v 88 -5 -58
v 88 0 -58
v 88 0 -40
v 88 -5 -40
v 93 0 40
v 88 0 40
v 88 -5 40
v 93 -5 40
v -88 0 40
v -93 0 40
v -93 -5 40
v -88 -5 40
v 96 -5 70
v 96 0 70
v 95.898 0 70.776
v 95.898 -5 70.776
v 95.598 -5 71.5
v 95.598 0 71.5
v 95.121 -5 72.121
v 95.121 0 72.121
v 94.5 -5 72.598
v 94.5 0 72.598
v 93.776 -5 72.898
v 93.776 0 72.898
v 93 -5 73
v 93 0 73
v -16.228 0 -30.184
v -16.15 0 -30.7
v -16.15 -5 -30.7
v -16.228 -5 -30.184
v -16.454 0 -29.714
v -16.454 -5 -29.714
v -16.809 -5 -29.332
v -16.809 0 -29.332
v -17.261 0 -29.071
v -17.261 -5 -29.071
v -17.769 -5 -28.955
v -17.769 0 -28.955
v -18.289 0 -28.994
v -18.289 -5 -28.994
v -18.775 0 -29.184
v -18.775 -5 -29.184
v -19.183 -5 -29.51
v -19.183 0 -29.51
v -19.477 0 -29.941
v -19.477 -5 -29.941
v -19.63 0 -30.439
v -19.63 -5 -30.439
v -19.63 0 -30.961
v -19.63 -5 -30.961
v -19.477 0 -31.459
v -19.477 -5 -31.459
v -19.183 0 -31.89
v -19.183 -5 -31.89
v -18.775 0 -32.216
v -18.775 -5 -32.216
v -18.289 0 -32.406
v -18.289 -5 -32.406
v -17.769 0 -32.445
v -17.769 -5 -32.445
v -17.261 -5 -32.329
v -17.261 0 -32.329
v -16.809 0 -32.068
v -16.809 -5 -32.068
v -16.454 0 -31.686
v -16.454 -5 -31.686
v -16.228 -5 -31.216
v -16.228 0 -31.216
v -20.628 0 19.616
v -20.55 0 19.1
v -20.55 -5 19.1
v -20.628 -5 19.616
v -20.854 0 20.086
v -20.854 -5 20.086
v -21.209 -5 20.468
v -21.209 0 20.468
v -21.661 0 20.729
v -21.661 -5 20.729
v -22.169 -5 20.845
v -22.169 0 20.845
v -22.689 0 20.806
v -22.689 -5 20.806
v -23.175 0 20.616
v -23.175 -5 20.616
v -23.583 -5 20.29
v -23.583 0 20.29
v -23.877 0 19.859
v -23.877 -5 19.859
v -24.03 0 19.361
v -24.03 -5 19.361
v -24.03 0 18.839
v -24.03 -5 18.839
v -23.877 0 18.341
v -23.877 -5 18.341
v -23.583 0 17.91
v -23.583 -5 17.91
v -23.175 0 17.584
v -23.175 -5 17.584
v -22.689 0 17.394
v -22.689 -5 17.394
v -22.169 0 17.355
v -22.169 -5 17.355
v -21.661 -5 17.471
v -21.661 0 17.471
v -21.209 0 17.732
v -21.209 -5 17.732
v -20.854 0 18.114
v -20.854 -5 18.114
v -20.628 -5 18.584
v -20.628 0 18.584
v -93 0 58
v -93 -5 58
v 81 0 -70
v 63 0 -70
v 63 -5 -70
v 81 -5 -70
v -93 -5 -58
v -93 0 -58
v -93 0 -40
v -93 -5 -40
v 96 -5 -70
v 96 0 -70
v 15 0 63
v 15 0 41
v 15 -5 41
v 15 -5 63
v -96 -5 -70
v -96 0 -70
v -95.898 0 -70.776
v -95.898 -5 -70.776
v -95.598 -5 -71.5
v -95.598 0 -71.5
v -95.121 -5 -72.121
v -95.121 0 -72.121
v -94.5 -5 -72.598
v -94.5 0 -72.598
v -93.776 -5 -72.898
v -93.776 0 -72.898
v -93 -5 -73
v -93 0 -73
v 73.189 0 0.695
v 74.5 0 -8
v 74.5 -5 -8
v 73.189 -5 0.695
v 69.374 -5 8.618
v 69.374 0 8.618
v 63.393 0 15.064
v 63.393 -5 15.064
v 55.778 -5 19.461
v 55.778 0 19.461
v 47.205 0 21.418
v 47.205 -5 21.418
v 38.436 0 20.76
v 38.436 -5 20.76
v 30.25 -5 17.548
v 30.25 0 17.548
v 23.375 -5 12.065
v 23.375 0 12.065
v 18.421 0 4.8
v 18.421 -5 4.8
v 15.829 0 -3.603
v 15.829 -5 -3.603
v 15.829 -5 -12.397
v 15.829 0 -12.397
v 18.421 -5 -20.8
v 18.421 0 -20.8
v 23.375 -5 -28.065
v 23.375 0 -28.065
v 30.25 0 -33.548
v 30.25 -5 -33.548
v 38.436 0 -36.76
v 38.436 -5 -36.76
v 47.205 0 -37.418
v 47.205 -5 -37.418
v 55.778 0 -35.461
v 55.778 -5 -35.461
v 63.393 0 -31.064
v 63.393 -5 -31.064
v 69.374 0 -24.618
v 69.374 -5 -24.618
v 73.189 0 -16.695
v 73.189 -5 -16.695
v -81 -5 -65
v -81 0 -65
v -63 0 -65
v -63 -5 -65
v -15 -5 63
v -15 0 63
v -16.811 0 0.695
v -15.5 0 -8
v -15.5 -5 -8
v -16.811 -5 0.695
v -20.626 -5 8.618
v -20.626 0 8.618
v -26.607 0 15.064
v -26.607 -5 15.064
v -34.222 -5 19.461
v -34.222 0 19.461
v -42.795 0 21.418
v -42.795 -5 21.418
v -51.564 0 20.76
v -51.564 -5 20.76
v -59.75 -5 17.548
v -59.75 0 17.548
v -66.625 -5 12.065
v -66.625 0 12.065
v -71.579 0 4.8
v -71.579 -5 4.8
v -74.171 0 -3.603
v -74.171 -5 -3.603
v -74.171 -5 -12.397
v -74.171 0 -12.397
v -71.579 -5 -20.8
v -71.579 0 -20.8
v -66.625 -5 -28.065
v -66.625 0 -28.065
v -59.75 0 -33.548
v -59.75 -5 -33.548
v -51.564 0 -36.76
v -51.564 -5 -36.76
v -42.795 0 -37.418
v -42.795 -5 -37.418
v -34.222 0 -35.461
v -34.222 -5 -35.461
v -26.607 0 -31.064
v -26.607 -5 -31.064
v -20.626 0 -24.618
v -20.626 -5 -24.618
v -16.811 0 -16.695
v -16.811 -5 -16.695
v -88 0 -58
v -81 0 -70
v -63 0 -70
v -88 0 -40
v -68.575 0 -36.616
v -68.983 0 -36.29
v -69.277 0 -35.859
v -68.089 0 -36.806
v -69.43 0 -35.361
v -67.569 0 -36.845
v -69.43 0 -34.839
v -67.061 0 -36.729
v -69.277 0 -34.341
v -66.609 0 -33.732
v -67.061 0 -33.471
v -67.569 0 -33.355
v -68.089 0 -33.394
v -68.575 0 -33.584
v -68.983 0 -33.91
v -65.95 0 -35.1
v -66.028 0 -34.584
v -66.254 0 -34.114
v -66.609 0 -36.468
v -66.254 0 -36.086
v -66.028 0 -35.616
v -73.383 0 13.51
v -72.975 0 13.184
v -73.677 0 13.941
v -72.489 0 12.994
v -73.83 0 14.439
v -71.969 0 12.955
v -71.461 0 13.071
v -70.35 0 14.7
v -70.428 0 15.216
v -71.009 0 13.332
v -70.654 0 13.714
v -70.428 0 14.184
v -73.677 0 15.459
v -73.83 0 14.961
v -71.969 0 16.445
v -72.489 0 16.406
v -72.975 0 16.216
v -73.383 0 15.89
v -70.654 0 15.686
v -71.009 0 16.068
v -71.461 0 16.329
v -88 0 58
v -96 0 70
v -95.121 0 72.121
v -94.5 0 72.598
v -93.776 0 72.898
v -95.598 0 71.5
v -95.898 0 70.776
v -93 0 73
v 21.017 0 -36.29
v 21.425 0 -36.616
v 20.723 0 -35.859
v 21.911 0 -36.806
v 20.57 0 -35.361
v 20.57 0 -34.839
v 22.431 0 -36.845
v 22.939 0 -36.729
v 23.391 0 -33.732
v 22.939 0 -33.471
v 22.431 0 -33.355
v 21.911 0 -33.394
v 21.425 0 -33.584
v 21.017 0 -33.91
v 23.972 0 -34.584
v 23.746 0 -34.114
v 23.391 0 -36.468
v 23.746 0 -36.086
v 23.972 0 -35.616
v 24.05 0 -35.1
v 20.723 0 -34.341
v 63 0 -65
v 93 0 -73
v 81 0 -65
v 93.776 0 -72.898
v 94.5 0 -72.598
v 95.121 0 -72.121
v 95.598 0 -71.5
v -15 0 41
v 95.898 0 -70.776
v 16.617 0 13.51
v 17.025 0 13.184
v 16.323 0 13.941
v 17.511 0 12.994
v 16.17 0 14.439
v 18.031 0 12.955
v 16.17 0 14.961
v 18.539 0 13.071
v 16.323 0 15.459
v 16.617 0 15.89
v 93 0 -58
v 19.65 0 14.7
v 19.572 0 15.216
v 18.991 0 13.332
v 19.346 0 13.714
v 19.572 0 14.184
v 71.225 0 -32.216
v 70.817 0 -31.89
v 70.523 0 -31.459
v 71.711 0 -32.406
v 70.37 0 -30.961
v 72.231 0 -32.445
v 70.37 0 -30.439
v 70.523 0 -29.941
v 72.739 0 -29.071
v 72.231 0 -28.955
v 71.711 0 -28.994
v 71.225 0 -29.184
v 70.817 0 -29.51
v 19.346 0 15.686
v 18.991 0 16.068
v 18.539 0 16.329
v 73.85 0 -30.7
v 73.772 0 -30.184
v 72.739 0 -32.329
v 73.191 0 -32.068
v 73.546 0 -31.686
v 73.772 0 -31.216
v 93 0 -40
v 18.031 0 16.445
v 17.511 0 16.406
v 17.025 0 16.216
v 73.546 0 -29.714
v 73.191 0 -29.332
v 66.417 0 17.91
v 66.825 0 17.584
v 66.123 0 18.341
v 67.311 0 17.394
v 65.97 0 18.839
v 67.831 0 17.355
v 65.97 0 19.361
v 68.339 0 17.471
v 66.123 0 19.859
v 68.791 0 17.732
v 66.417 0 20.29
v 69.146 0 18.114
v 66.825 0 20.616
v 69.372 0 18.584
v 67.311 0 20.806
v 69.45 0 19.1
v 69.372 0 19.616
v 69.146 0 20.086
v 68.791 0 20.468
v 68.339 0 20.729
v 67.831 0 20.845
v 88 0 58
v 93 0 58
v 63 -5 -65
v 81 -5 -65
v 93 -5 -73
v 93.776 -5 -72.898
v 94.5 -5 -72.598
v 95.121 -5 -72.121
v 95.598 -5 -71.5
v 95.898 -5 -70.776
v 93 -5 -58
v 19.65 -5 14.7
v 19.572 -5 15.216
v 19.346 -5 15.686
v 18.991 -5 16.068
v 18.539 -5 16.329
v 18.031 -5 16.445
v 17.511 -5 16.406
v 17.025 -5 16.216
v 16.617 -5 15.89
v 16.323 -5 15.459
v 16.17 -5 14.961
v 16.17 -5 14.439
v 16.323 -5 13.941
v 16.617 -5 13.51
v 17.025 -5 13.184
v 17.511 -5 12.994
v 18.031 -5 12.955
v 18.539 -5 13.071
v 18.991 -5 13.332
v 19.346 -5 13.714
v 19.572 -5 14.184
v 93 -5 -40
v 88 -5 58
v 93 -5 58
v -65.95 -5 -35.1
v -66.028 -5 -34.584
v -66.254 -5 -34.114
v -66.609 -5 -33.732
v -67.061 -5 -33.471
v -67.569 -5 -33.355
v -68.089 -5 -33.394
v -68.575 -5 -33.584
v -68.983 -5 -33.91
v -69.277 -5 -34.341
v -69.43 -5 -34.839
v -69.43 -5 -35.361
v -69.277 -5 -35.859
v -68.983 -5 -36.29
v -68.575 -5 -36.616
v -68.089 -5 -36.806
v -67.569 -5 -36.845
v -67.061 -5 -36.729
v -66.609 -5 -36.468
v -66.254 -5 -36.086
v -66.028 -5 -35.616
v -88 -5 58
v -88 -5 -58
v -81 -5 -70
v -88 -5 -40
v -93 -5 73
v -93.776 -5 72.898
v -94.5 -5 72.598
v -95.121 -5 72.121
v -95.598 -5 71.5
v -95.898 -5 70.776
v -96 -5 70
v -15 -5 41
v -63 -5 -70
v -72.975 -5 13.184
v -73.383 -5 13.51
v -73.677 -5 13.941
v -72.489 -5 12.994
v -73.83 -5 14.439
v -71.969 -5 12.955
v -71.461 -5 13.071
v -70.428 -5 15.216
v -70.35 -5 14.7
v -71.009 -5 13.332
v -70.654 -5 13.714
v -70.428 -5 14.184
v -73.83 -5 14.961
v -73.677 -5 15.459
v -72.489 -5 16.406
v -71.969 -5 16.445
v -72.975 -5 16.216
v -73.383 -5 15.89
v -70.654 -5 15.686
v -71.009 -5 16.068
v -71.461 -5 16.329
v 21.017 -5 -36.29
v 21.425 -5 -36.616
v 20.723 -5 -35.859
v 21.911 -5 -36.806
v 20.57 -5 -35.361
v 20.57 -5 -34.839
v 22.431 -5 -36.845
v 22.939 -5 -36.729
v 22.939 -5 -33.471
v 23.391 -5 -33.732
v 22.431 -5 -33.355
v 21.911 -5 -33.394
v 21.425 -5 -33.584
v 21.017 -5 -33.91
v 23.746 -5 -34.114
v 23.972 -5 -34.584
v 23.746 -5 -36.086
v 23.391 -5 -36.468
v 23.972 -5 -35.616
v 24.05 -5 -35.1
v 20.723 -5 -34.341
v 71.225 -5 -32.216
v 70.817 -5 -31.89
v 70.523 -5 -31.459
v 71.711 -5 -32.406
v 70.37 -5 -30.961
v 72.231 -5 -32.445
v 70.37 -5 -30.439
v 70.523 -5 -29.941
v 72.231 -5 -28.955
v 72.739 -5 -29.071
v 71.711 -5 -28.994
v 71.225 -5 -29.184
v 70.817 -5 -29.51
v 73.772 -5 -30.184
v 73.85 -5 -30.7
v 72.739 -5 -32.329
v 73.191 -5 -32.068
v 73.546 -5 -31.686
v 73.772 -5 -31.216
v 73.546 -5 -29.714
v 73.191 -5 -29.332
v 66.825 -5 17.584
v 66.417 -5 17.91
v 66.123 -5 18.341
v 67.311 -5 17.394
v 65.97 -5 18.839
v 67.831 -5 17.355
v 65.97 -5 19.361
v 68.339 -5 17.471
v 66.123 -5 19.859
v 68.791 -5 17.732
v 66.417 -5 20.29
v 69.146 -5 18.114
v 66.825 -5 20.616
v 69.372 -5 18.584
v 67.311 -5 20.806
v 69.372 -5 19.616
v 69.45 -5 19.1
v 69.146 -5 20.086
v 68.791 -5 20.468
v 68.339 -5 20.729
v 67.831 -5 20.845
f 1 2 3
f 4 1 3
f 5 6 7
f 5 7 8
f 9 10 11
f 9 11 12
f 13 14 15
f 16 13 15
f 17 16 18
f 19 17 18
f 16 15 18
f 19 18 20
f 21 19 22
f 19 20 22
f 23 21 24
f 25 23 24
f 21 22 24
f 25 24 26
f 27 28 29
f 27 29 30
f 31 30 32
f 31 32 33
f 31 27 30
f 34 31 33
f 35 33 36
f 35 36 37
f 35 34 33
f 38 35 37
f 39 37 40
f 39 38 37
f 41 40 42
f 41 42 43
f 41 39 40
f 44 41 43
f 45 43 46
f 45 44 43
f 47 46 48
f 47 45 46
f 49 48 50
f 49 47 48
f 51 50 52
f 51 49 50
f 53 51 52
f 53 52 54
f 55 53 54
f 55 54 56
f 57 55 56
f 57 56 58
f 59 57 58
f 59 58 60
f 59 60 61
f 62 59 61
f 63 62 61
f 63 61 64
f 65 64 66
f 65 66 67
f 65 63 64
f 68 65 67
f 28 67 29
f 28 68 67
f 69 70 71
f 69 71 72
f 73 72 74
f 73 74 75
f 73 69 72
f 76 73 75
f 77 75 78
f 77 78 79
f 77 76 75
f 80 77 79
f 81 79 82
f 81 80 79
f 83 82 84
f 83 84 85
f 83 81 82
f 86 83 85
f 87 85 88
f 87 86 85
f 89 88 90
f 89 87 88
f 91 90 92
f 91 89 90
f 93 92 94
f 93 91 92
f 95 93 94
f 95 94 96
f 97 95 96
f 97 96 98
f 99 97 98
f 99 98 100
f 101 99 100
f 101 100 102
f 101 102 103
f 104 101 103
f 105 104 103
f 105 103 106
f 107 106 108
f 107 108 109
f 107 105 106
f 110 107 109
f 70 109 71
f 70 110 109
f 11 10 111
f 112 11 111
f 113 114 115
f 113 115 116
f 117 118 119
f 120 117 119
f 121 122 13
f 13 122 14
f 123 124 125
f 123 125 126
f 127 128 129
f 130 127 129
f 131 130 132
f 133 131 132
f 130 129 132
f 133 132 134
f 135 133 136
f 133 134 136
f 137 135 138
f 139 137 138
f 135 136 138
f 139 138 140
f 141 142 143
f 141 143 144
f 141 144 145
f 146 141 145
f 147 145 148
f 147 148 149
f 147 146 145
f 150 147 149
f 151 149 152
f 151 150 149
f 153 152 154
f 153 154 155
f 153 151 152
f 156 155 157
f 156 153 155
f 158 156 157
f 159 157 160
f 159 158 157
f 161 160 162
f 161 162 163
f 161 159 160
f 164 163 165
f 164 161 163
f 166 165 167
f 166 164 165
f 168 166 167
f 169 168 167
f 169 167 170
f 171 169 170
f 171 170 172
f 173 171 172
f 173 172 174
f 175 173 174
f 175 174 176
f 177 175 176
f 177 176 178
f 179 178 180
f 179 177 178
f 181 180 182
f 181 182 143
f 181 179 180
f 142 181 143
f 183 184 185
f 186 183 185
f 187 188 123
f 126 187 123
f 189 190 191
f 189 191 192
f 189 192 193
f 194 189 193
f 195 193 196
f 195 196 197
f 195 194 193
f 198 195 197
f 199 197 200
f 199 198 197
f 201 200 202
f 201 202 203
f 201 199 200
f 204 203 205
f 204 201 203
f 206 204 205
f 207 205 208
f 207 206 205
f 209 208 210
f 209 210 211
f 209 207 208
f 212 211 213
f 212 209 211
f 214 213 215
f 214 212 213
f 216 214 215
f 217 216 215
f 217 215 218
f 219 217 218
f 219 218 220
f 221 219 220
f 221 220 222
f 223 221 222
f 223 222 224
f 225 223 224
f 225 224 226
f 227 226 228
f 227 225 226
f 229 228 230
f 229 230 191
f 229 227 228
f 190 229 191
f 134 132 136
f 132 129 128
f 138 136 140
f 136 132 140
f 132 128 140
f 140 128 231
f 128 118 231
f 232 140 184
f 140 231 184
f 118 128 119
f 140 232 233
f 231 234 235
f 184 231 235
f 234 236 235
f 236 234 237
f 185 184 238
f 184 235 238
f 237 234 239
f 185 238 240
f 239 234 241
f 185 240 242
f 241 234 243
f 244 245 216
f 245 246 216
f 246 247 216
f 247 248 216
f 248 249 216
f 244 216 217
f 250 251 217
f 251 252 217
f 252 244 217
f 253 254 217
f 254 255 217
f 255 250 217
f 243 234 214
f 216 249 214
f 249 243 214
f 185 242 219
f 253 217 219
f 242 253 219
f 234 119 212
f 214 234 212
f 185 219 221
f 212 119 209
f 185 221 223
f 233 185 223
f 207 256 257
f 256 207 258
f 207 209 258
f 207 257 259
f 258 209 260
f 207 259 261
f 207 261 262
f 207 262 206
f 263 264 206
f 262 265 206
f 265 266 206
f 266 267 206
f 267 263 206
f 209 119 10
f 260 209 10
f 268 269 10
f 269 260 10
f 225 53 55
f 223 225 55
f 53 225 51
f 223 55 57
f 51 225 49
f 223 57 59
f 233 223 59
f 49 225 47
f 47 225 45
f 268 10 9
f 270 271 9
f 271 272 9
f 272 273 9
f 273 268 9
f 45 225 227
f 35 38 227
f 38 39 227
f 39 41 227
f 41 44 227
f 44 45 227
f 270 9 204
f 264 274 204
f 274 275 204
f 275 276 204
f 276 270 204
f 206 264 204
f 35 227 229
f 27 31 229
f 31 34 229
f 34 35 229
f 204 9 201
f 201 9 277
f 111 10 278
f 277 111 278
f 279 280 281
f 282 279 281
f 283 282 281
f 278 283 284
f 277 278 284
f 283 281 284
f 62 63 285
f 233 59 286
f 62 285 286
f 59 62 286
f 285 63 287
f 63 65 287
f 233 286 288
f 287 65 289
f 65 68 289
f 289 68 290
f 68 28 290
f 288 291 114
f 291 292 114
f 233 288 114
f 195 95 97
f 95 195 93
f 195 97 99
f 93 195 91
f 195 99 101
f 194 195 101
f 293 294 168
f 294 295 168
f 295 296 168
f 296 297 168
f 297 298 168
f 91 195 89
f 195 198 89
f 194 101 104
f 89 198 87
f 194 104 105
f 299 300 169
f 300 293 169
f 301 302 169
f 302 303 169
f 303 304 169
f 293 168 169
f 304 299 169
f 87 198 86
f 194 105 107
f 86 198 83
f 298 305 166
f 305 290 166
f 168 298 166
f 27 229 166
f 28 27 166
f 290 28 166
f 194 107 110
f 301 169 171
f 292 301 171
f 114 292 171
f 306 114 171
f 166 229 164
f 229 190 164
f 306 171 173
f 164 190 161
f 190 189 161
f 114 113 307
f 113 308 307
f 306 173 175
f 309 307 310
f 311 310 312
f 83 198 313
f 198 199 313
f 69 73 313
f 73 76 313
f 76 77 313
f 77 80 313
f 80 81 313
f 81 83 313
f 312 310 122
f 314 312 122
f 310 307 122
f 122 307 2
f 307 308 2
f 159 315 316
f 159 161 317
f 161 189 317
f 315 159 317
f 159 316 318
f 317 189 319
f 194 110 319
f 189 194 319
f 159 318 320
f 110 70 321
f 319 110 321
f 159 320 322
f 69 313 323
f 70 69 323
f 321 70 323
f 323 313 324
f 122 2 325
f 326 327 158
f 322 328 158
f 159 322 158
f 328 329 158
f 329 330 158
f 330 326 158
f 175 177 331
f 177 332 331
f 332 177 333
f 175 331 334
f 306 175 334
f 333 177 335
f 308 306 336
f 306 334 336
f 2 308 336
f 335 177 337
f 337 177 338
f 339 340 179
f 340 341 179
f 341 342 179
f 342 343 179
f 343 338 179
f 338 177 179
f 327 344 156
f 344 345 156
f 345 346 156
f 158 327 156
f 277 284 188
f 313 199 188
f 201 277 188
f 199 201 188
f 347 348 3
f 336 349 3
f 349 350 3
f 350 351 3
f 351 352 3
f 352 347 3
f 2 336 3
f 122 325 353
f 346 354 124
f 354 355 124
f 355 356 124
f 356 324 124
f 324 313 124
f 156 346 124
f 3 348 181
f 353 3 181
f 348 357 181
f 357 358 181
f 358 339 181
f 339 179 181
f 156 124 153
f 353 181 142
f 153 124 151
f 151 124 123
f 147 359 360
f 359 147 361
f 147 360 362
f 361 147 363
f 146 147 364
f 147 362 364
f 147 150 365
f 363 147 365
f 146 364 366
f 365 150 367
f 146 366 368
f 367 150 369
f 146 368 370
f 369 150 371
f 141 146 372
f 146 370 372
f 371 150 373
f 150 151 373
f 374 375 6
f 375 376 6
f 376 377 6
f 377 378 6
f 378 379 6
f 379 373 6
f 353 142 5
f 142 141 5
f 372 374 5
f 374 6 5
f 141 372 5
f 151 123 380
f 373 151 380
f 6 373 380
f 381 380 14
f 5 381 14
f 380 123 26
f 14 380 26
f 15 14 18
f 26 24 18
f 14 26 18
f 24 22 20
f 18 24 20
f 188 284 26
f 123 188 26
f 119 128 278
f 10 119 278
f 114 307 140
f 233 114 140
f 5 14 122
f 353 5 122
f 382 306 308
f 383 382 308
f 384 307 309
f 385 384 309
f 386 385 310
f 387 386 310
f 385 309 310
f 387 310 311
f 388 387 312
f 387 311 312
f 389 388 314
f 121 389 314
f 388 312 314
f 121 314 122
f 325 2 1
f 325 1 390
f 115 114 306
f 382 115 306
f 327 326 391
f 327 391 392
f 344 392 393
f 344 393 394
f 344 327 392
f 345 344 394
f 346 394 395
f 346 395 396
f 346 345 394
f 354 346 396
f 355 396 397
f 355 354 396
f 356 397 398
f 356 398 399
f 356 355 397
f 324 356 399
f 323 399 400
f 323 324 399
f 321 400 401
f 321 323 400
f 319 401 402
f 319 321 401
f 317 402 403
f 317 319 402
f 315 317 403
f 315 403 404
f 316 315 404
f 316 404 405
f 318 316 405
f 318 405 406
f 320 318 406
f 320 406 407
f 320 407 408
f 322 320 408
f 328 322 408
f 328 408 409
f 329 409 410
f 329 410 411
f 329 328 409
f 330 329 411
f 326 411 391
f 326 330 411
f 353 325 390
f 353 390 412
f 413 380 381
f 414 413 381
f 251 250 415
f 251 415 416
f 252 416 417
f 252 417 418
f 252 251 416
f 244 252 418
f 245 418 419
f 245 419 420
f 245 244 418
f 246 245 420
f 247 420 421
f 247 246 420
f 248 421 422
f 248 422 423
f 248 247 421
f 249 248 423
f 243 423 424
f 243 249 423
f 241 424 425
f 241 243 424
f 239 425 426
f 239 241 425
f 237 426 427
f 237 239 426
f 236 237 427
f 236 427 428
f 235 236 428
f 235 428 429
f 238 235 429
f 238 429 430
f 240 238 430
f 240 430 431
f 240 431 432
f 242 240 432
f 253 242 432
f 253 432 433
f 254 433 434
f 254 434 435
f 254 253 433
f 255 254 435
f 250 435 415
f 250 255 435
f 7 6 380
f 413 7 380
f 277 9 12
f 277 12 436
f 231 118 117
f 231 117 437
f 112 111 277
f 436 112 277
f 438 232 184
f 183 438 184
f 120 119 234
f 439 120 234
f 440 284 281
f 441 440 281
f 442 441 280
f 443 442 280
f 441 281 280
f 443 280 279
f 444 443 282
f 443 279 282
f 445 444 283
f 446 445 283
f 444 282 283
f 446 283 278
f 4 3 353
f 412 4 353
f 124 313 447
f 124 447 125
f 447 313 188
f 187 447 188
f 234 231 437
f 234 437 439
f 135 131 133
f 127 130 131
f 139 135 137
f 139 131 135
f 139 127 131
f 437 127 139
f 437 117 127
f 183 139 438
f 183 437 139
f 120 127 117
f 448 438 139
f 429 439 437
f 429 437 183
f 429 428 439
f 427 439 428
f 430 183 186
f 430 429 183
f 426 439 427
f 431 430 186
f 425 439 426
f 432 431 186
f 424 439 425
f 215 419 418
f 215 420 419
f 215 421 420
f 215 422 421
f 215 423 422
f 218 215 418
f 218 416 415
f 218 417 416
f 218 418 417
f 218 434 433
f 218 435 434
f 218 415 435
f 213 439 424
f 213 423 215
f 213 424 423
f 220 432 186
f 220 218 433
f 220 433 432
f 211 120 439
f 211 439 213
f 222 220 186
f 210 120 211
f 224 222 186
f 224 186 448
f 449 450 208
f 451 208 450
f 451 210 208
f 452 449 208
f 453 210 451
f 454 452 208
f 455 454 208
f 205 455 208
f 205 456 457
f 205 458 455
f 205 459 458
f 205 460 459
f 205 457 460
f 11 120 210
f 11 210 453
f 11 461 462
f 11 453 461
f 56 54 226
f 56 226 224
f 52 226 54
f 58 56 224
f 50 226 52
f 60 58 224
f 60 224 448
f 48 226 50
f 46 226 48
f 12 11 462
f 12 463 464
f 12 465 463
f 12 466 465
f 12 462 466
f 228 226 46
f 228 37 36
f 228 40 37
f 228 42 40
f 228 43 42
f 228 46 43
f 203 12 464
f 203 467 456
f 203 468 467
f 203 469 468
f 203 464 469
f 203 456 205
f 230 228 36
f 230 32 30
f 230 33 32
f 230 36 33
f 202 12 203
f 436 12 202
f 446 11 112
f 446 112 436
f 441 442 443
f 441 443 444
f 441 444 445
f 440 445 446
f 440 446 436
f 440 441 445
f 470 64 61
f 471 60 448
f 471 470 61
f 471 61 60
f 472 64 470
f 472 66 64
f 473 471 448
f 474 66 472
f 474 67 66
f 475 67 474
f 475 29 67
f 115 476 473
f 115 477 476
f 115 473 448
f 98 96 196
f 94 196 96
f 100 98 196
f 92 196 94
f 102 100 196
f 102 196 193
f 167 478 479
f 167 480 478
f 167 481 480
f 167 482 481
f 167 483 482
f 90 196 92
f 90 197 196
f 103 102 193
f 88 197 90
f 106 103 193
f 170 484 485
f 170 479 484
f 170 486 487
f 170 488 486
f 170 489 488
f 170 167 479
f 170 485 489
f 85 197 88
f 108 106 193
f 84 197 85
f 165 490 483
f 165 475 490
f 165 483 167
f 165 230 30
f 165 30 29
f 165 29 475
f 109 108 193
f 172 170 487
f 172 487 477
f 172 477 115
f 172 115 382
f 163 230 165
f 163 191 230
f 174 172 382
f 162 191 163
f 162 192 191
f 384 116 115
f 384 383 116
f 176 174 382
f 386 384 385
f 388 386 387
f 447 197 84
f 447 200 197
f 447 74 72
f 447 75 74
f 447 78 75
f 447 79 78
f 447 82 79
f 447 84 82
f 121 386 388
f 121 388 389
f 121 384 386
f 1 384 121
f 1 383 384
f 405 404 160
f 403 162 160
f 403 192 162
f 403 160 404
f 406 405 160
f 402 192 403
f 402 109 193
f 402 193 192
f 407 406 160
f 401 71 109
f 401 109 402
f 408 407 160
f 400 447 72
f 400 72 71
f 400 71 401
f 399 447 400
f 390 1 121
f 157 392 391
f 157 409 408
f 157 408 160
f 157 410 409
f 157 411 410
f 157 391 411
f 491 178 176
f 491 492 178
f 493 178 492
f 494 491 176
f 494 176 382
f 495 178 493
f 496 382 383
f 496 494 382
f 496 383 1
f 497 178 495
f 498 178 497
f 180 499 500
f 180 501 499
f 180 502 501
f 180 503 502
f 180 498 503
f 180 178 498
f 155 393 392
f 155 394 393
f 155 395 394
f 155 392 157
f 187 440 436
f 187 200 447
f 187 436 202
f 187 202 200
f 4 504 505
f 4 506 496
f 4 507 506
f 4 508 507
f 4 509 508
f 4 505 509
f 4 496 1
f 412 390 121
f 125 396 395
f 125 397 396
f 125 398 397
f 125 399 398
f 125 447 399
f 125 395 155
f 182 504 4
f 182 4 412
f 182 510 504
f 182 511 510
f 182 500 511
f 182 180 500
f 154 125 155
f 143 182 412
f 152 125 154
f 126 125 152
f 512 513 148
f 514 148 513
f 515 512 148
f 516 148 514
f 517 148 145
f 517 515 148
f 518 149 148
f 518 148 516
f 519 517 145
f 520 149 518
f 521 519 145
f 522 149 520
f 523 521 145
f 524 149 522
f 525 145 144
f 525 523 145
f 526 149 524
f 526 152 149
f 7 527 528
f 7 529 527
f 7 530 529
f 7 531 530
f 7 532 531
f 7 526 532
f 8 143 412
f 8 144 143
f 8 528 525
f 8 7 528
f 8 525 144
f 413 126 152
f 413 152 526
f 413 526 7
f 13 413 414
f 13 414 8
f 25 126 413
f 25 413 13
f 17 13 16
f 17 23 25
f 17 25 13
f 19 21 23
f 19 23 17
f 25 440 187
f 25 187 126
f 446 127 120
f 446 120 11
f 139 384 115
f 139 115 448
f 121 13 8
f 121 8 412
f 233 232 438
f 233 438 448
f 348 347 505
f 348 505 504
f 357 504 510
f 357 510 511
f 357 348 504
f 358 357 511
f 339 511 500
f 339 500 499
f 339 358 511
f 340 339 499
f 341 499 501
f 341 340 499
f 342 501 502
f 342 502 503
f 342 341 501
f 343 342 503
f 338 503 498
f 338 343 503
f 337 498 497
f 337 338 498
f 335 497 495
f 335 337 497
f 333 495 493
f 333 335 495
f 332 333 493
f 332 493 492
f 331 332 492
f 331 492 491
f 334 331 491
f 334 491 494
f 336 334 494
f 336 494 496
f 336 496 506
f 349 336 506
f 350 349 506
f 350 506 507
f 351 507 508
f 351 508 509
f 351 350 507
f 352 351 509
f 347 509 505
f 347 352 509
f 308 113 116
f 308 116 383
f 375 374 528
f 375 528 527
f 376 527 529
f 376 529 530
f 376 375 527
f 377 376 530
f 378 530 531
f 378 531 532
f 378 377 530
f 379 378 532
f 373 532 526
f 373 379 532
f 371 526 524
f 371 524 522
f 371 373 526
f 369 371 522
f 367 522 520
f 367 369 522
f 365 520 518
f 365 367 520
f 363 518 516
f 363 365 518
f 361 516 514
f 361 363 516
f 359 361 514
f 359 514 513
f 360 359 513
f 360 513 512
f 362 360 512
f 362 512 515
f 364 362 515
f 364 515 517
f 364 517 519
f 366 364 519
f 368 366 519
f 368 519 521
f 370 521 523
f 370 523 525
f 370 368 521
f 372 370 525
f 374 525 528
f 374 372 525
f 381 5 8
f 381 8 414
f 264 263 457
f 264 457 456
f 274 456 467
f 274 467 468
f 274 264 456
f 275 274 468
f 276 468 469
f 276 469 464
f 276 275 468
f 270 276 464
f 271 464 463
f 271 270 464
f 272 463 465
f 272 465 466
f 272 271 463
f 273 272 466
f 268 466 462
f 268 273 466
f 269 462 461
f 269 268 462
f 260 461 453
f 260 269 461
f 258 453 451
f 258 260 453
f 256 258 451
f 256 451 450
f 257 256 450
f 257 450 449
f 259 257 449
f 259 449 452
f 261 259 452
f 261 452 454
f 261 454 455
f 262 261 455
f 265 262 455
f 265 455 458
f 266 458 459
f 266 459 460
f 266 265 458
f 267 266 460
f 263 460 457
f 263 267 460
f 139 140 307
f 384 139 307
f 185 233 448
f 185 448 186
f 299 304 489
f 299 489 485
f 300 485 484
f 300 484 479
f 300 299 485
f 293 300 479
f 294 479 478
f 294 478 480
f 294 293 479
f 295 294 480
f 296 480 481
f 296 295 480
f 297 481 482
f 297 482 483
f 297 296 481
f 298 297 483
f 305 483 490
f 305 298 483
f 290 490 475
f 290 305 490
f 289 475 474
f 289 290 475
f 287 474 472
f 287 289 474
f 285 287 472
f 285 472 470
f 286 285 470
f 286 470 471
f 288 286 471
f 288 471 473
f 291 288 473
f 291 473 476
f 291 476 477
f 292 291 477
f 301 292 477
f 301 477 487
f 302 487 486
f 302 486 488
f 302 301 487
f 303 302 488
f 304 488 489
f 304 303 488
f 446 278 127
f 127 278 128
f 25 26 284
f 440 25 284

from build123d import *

# Parameters (mm, degrees)
F0_W     = 18
F0_H     = 5
F0_W_2   = 5
F0_H_2   = 18
F0_R     = 1.75
F0_R_2   = 29.5
F0_W_3   = 30
F0_H_3   = 22
F1_DEPTH = 5


with BuildPart() as f1:
    # F0 (on Front) → F1 (new body)
    with BuildSketch(Plane.XZ):
        with BuildLine():
            Line((93, 73), (-93, 73))
            ThreePointArc((-93, 73), (-95.12132, 72.12132), (-96, 70))
            Line((-96, 70), (-96, -70))
            ThreePointArc((-96, -70), (-95.12132, -72.12132), (-93, -73))
            Line((-93, -73), (93, -73))
            ThreePointArc((93, -73), (95.12132, -72.12132), (96, -70))
            Line((96, -70), (96, 70))
            ThreePointArc((96, 70), (95.12132, 72.12132), (93, 73))
        make_face()
        with Locations((-72, -67.5)):
            Rectangle(F0_W, F0_H, mode=Mode.SUBTRACT)
        with Locations((-90.5, -49)):
            Rectangle(F0_W_2, F0_H_2, mode=Mode.SUBTRACT)
        with Locations((-67.7, -35.1)):
            Circle(F0_R, mode=Mode.SUBTRACT)
        with Locations((-17.9, -30.7)):
            Circle(F0_R, mode=Mode.SUBTRACT)
        with Locations((-45, -8)):
            Circle(F0_R_2, mode=Mode.SUBTRACT)
        with Locations((72, -67.5)):
            Rectangle(F0_W, F0_H, mode=Mode.SUBTRACT)
        with Locations((90.5, -49)):
            Rectangle(F0_W_2, F0_H_2, mode=Mode.SUBTRACT)
        with Locations((22.3, -35.1)):
            Circle(F0_R, mode=Mode.SUBTRACT)
        with Locations((45, -8)):
            Circle(F0_R_2, mode=Mode.SUBTRACT)
        with Locations((72.1, -30.7)):
            Circle(F0_R, mode=Mode.SUBTRACT)
        with Locations((-72.1, 14.7)):
            Circle(F0_R, mode=Mode.SUBTRACT)
        with Locations((-22.3, 19.1)):
            Circle(F0_R, mode=Mode.SUBTRACT)
        with Locations((-90.5, 49)):
            Rectangle(F0_W_2, F0_H_2, mode=Mode.SUBTRACT)
        with Locations((-72, 67.5)):
            Rectangle(F0_W, F0_H, mode=Mode.SUBTRACT)
        with Locations((17.9, 14.7)):
            Circle(F0_R, mode=Mode.SUBTRACT)
        with Locations((67.7, 19.1)):
            Circle(F0_R, mode=Mode.SUBTRACT)
        with Locations((0, 52)):
            Rectangle(F0_W_3, F0_H_3, mode=Mode.SUBTRACT)
        with Locations((90.5, 49)):
            Rectangle(F0_W_2, F0_H_2, mode=Mode.SUBTRACT)
        with Locations((72, 67.5)):
            Rectangle(F0_W, F0_H, mode=Mode.SUBTRACT)
        with Locations((-72, 67.5)):
            Rectangle(F0_W, F0_H)
        with Locations((72, 67.5)):
            Rectangle(F0_W, F0_H)
    extrude(amount=F1_DEPTH)


solid = f1.part
